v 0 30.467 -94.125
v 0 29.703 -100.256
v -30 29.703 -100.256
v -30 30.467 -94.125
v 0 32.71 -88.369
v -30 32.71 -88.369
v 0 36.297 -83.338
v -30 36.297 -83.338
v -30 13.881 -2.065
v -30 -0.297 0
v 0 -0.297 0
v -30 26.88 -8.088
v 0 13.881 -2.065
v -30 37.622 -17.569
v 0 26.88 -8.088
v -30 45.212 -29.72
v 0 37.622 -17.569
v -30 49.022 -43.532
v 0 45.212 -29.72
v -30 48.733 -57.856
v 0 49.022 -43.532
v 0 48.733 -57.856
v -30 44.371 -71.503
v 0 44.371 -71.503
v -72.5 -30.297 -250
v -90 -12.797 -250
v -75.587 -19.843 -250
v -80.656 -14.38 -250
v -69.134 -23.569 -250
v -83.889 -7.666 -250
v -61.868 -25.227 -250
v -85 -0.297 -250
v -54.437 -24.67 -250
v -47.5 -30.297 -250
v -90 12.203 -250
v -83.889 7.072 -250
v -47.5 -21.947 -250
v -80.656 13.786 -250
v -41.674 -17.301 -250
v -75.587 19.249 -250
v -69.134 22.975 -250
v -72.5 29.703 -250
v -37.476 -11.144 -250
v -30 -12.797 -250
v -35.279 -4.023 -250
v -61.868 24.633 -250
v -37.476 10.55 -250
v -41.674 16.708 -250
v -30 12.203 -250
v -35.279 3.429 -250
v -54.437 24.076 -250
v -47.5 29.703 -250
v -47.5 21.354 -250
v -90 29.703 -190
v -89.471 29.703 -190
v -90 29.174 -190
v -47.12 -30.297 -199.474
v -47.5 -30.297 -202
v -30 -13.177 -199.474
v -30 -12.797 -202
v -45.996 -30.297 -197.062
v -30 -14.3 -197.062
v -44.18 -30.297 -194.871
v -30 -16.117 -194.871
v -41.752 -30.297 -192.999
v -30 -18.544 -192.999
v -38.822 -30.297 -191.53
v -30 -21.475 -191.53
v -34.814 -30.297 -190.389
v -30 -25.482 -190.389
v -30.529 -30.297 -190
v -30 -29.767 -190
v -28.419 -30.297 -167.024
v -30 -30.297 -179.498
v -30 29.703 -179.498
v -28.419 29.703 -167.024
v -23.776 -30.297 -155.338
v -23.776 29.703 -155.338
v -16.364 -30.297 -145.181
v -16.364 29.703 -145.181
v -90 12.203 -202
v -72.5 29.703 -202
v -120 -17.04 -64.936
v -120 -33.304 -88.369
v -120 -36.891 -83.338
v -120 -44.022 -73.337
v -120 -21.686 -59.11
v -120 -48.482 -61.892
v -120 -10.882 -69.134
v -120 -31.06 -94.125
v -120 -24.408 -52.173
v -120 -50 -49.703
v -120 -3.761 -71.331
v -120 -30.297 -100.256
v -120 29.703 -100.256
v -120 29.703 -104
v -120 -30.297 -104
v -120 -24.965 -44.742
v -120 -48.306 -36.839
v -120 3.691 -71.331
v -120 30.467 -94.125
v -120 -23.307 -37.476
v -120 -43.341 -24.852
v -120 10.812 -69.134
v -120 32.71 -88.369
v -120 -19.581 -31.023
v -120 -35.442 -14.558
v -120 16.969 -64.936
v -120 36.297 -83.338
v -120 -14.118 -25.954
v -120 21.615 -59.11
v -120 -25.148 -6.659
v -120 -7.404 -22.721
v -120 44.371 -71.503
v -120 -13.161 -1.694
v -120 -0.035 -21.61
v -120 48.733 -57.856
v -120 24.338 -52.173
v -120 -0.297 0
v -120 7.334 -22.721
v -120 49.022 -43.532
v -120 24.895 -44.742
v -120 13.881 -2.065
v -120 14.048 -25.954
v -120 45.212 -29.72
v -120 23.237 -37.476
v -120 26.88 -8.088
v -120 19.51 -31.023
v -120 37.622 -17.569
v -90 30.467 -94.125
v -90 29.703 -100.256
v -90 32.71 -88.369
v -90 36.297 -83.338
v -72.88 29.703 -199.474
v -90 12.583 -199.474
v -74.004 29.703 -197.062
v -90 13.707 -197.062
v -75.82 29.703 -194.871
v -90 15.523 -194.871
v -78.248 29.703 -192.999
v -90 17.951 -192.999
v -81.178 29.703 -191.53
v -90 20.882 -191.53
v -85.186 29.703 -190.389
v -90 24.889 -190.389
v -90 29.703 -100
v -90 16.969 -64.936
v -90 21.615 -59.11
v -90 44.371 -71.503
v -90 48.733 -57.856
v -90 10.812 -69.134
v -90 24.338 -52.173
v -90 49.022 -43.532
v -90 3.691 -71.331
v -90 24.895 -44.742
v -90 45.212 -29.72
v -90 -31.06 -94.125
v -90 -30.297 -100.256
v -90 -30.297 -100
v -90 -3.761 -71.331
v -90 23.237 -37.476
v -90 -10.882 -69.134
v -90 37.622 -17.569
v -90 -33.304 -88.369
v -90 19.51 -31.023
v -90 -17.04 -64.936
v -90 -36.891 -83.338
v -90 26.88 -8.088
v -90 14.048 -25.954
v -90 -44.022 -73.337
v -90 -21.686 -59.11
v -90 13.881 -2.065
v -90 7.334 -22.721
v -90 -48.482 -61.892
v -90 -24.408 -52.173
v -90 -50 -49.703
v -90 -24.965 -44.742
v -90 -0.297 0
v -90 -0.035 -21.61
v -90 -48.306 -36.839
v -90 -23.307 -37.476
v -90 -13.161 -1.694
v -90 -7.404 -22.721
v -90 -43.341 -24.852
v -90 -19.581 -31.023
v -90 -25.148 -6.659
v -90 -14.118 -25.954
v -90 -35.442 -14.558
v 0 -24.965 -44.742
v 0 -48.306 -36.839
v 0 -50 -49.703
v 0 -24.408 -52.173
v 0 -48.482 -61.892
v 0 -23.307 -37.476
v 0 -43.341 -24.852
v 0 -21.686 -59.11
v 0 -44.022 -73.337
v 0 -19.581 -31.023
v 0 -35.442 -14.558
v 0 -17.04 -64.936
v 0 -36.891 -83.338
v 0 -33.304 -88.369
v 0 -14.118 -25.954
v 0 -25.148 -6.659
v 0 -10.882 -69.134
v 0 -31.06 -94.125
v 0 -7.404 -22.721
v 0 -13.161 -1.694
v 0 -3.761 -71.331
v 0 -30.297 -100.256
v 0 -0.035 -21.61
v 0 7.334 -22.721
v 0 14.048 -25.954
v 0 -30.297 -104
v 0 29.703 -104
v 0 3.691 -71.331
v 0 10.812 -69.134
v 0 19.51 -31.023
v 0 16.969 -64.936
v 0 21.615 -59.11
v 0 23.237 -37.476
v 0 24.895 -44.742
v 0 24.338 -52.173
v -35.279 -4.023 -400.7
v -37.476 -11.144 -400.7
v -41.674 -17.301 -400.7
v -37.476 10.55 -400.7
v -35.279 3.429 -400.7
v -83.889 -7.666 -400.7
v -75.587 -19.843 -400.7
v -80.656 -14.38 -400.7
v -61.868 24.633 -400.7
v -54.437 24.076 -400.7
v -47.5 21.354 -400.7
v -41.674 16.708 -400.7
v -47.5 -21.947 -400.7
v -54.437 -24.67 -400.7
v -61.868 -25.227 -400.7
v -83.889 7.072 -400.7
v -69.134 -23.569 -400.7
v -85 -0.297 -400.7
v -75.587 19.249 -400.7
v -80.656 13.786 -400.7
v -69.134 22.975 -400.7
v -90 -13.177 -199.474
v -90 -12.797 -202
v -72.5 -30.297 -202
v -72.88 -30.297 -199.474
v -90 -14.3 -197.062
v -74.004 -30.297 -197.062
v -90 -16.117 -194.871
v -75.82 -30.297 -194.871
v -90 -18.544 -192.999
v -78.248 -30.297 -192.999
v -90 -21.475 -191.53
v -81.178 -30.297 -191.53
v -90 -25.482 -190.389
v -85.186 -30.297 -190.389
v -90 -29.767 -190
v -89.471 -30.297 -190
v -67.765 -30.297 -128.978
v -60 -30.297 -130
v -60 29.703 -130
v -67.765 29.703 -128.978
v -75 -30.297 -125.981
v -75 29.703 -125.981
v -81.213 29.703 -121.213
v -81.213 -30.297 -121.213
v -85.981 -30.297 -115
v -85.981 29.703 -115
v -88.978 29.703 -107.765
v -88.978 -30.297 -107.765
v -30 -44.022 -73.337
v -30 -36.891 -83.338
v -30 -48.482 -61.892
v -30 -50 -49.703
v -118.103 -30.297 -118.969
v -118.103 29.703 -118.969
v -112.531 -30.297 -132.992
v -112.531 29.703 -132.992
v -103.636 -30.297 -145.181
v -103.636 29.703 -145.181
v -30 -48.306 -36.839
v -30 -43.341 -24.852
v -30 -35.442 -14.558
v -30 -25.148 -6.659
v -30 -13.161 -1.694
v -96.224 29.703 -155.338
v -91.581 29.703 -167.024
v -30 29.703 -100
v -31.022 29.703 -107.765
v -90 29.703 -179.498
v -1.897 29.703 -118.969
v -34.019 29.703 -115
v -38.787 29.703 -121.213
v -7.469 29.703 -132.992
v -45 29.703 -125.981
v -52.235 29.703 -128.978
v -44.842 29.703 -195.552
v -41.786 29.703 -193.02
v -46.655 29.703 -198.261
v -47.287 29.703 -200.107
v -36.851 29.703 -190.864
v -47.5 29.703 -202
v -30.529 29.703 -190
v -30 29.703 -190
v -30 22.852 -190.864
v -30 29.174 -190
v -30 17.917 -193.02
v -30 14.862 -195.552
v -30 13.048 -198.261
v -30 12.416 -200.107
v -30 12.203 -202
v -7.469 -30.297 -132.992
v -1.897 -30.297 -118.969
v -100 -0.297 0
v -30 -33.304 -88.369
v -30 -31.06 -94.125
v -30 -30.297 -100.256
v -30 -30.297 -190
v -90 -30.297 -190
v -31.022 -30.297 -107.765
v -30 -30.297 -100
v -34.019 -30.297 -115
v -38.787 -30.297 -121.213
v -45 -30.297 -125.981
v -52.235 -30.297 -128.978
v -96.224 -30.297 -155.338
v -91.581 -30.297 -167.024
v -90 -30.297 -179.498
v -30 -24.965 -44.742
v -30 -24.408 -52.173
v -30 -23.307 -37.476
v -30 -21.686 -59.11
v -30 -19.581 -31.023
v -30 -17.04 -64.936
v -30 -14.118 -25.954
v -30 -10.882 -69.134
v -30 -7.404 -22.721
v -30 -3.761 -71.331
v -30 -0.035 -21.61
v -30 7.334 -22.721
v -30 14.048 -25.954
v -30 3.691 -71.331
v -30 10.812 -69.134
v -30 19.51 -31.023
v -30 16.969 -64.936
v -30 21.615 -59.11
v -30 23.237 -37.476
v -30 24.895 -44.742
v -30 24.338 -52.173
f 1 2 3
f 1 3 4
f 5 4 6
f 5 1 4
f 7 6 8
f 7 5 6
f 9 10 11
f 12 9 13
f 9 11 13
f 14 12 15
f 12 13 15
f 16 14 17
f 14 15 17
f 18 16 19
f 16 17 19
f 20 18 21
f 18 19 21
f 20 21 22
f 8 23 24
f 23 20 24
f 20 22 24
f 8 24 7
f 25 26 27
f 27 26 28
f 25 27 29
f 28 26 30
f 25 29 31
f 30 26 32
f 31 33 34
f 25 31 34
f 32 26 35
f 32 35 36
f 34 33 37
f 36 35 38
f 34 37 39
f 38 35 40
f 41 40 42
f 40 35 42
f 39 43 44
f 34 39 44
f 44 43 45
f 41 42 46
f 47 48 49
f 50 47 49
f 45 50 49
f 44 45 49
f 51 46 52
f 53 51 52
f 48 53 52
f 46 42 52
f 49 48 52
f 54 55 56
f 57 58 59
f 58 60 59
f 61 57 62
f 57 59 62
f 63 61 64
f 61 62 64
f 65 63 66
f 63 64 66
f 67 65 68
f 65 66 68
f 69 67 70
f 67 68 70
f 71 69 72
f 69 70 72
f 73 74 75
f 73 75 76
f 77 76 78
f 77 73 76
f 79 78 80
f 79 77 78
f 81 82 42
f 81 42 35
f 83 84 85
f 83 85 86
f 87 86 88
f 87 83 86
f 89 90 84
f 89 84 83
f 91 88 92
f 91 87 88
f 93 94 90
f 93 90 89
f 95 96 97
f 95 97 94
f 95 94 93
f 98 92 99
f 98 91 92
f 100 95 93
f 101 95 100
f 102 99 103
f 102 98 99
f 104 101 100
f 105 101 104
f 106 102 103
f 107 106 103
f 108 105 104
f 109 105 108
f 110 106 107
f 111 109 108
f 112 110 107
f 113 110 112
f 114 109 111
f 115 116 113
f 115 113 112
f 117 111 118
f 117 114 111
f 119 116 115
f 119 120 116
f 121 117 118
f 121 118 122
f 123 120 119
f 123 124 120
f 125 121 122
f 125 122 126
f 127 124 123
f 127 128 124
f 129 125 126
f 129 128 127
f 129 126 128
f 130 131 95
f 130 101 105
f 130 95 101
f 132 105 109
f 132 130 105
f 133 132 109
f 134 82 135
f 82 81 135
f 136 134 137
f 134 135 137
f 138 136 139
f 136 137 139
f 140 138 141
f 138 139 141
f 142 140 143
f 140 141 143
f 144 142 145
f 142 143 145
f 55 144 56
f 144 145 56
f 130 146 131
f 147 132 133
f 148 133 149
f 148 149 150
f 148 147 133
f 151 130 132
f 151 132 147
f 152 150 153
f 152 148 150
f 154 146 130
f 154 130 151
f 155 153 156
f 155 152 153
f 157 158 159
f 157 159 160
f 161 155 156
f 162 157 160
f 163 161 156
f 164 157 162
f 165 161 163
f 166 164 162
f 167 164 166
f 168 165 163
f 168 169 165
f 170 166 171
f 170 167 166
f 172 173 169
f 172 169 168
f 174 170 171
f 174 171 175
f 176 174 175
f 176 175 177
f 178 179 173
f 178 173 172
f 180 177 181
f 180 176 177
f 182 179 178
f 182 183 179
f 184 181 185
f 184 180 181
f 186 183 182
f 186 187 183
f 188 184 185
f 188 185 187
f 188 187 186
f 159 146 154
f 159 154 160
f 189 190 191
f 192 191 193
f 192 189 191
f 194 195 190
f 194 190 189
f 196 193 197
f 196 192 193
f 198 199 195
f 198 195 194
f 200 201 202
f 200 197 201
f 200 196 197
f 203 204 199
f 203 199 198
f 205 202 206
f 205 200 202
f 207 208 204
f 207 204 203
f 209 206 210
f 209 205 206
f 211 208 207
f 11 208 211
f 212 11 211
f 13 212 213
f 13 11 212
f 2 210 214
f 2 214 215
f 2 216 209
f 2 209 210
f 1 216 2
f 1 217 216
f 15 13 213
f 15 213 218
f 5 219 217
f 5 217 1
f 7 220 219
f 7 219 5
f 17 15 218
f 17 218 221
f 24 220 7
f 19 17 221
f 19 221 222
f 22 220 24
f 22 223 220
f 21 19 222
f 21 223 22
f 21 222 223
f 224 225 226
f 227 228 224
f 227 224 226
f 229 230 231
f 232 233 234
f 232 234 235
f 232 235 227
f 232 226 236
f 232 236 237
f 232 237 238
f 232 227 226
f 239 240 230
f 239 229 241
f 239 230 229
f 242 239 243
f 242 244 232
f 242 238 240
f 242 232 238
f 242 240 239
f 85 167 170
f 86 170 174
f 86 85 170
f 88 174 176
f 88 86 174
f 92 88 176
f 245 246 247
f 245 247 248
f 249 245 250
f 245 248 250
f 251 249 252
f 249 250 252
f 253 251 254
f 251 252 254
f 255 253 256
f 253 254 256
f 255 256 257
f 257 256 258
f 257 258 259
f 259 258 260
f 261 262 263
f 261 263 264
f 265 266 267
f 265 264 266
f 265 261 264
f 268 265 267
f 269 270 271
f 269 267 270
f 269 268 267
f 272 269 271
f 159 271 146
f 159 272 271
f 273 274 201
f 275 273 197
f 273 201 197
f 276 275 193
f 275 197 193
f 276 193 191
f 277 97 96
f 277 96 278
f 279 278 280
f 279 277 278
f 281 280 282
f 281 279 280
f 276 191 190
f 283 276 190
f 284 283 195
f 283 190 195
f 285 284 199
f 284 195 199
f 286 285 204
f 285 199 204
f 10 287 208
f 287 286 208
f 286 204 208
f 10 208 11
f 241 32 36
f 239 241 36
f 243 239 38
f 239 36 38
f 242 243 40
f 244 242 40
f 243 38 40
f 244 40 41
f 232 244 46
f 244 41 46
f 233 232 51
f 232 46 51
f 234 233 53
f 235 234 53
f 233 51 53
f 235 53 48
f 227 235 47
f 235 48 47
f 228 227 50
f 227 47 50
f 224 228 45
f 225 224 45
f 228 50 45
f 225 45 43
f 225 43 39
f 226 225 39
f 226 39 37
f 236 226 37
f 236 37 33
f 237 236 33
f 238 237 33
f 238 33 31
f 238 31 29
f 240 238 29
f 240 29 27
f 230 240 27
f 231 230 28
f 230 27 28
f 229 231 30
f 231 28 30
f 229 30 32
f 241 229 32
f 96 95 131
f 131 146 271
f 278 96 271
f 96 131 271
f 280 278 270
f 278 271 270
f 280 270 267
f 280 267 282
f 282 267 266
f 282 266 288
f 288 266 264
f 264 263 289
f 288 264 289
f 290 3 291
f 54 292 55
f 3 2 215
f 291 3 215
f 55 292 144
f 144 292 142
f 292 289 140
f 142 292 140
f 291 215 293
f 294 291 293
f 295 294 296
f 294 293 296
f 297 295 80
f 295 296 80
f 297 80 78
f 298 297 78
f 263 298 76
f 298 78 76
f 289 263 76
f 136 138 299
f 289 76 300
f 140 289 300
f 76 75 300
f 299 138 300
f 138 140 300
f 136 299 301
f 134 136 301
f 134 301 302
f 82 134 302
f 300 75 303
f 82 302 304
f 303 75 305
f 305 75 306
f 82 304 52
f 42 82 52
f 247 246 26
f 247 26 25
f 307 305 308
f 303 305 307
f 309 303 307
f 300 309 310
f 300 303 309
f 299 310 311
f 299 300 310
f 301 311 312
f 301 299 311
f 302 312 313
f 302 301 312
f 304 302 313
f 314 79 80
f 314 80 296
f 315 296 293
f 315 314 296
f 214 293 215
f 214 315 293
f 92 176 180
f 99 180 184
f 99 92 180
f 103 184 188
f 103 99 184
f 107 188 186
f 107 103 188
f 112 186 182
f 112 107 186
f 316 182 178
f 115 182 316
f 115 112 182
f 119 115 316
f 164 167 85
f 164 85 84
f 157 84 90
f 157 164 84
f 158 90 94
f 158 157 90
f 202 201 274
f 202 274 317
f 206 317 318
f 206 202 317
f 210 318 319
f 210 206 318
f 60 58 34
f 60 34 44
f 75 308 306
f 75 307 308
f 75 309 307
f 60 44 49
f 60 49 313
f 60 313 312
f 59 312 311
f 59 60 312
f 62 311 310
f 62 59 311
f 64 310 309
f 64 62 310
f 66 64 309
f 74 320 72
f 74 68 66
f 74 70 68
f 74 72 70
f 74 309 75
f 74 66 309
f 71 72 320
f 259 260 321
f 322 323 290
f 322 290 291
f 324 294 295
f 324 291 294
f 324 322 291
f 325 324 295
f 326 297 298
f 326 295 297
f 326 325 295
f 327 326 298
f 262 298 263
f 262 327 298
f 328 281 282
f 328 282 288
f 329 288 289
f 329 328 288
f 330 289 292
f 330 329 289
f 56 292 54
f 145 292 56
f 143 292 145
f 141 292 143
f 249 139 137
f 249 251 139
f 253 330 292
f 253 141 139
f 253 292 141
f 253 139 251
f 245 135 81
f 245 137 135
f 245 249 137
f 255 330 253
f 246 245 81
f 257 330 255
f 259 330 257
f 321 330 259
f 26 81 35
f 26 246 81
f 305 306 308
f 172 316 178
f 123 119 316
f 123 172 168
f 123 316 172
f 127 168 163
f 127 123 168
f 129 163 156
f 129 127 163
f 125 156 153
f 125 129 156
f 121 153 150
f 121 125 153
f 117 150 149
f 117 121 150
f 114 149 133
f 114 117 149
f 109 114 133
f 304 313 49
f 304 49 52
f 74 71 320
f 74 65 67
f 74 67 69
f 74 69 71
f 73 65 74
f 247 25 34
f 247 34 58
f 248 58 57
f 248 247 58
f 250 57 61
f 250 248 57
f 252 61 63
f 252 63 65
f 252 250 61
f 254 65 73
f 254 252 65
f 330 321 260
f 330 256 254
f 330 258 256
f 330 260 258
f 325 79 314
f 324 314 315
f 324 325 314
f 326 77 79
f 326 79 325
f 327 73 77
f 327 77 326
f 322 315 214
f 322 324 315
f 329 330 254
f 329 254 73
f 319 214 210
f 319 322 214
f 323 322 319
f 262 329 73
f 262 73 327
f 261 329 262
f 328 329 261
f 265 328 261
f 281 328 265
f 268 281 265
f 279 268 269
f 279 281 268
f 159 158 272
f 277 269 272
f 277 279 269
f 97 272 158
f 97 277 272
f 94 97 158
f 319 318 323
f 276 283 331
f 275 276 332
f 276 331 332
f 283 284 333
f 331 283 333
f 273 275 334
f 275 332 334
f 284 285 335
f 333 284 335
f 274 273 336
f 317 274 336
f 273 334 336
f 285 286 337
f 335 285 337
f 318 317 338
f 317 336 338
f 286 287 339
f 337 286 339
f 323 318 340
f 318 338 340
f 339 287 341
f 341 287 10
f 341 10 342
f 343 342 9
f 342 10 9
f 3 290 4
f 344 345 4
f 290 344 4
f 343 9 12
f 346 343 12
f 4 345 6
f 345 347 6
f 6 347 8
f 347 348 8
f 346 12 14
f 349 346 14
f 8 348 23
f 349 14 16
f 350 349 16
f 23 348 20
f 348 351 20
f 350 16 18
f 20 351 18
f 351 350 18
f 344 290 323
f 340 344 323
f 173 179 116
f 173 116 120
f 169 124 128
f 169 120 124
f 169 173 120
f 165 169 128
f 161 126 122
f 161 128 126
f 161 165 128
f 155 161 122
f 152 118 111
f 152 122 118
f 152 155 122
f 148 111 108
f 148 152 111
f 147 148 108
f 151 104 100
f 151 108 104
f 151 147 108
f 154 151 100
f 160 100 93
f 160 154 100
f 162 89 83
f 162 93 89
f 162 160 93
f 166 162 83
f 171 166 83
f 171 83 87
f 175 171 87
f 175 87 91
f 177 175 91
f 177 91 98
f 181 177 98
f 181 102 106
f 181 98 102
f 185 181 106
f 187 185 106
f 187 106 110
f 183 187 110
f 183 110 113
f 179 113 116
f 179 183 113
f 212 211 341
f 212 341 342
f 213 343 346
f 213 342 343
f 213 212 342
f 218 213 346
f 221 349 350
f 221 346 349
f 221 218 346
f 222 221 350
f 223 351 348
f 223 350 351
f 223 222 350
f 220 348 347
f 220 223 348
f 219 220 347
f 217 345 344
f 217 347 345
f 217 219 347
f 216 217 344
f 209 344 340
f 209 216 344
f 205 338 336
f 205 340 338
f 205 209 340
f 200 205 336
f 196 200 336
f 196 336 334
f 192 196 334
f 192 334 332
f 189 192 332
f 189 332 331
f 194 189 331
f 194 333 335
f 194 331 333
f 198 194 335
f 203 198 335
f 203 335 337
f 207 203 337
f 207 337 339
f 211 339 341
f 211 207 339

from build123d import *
from build123d.topology import SkipClean

# Parameters (mm, degrees)
SKETCH2_W                = 120
SKETCH2_H                = 250
BOSS_EXTRUDE1_DEPTH      = 50
CUT_EXTRUDE1_DEPTH       = 295.78805946
CUT_EXTRUDE1_DEPTH_BACK  = 295.78805946
CUT_EXTRUDE2_DEPTH       = 100
CUT_EXTRUDE3_DEPTH       = 282.780056072
CUT_EXTRUDE3_DEPTH_BACK  = 282.780056072
FILLET1_R                = 25
CUT_EXTRUDE5_DEPTH       = 60
FILLET4_R                = 12
SKETCH8_R                = 25
BOSS_EXTRUDE2_DEPTH      = 150.7
CUT_EXTRUDE11_DEPTH      = 422.260596346
CUT_EXTRUDE11_DEPTH_BACK = 422.260596346
SKETCH9_R                = 25


with BuildPart() as part:
    # Sketch2 → Boss-Extrude1 (new, symmetric)
    with BuildSketch(Plane(origin=(0, 0, 0), x_dir=(1, 0, 0), z_dir=(0, 1, 0))):
        with Locations((-60, 125)):
            Rectangle(SKETCH2_W, SKETCH2_H)
    extrude(amount=BOSS_EXTRUDE1_DEPTH, both=True)

    # Sketch3 → Cut-Extrude1 (cut, two sides: drawn at the far end of the back side and taken through both)
    with BuildSketch(Plane(origin=(0, 50, 0), x_dir=(1, 0, 0), z_dir=(0, 1, 0)).offset(-CUT_EXTRUDE1_DEPTH_BACK)):
        with BuildLine():
            ThreePointArc((-30, 100), (-60, 130), (-90, 100))
            Line((-90, 100), (-90, 0))
            Line((-90, 0), (-30, 0))
            Line((-30, 0), (-30, 100))
        make_face()
        with BuildLine():
            Line((-120, 250), (-120, 104))
            ThreePointArc((-120, 104), (-115.759222637, 126.156468376), (-103.636363636, 145.180915101))
            ThreePointArc((-103.636363636, 145.180915101), (-93.533981136, 161.034620706), (-90, 179.498344353))
            Line((-90, 179.498344353), (-90, 250))
            Line((-90, 250), (-120, 250))
        make_face()
        with BuildLine():
            ThreePointArc((-16.363636364, 145.180915101), (-4.240777363, 126.156468376), (0, 104))
            Line((0, 104), (0, 250))
            Line((0, 250), (-30, 250))
            Line((-30, 250), (-30, 179.498344353))
            ThreePointArc((-30, 179.498344353), (-26.466018864, 161.034620706), (-16.363636364, 145.180915101))
        make_face()
    extrude(amount=CUT_EXTRUDE1_DEPTH + CUT_EXTRUDE1_DEPTH_BACK, mode=Mode.SUBTRACT)

    # Sketch4 → Cut-Extrude2 (cut)
    with BuildSketch(Plane(origin=(0, 0, 0), x_dir=(0, 0, -1), z_dir=(1, 0, 0))):
        with BuildLine():
            ThreePointArc((89.331663554, -30.296760633), (71.831443345, -44.802429848), (49.703239367, -50))
            Line((49.703239367, -50), (250, -50))
            Line((250, -50), (250, -30.296760633))
            Line((250, -30.296760633), (89.331663554, -30.296760633))
        make_face()
        with BuildLine():
            Line((0, -50), (49.703239367, -50))
            ThreePointArc((49.703239367, -50), (14.557741777, -35.442258249), (0, -0.29676067))
            Line((0, -0.29676067), (0, -50))
        make_face()
        with BuildLine():
            Line((0, 50), (0, -0.29676067))
            ThreePointArc((0, -0.29676067), (33.879981934, 46.820502952), (89.331663554, 29.703239367))
            Line((89.331663554, 29.703239367), (250, 29.703239367))
            Line((250, 29.703239367), (250, 50))
            Line((250, 50), (0, 50))
        make_face()
    extrude(amount=-CUT_EXTRUDE2_DEPTH, mode=Mode.SUBTRACT)

    # Sketch5 → Cut-Extrude3 (cut, two sides: drawn at the far end of the back side and taken through both)
    with SkipClean():  # the faces are left unmerged after this step: merging them gives an invalid solid
        with BuildSketch(Plane(origin=(0, 0, 0), x_dir=(0, 0, -1), z_dir=(1, 0, 0)).offset(-CUT_EXTRUDE3_DEPTH_BACK)):
            with BuildLine():
                Line((89.331663554, 29.703239367), (149.498344353, 29.703239367))
                Line((149.498344353, 29.703239367), (149.498344353, 50))
                Line((149.498344353, 50), (0, 50))
                Line((0, 50), (0, -0.296760633))
                ThreePointArc((0, -0.296760633), (33.879981952, 46.820502958), (89.331663554, 29.703239367))
            make_face()
            with BuildLine():
                Line((149.498344353, -30.296760633), (89.331663554, -30.296760633))
                ThreePointArc((89.331663554, -30.296760633), (71.831443345, -44.802429848), (49.703239367, -50))
                Line((49.703239367, -50), (149.498344353, -50))
                Line((149.498344353, -50), (149.498344353, -30.296760633))
            make_face()
            with BuildLine():
                ThreePointArc((49.703239367, -50), (14.557741764, -35.442258236), (0, -0.296760633))
                Line((0, -0.296760633), (0, -50))
                Line((0, -50), (49.703239367, -50))
            make_face()
        extrude(amount=CUT_EXTRUDE3_DEPTH + CUT_EXTRUDE3_DEPTH_BACK, mode=Mode.SUBTRACT)

    # Fillet1
    fillet1_edges = [part.edges().sort_by_distance(p)[0] for p in [
        (-15, -30.296760633, -89.331663554),
    ]]
    fillet(fillet1_edges, radius=FILLET1_R)
    fillet1_2_edges = [part.edges().sort_by_distance(p)[0] for p in [
        (-95, -30.296760633, -89.331663554),
        (-110, -30.296760633, -89.331663554),
    ]]
    fillet(fillet1_2_edges, radius=FILLET1_R)
    fillet1_3_edges = [part.edges().sort_by_distance(p)[0] for p in [
        (-95, 29.703239367, -89.331663554),
        (-110, 29.703239367, -89.331663554),
    ]]
    fillet(fillet1_3_edges, radius=FILLET1_R)
    fillet1_4_edges = [part.edges().sort_by_distance(p)[0] for p in [
        (-15, 29.703239367, -89.331663554),
    ]]
    fillet(fillet1_4_edges, radius=FILLET1_R)

    # Sketch6 → Cut-Extrude5 (cut)
    with BuildSketch(Plane(origin=(0, 0, -250), x_dir=(-1, 0, 0), z_dir=(0, 0, -1))):
        Polygon((90, 12.203239367), (90, 29.703239367), (72.5, 29.703239367), align=None)
        Polygon((90, -30.296760633), (90, -12.796760633), (72.5, -30.296760633), align=None)
        Polygon((47.5, -30.296760633), (30, -12.796760633), (30, -30.296760633), align=None)
        Polygon((30, 12.203239367), (47.5, 29.703239367), (30, 29.703239367), align=None)
    extrude(amount=-CUT_EXTRUDE5_DEPTH, mode=Mode.SUBTRACT)

    # Fillet4
    fillet4_edges = [part.edges().sort_by_distance(p)[0] for p in [
        (-81.25, -21.546760633, -190),
        (-81.25, 20.953239367, -190),
        (-38.75, -21.546760633, -190),
        (-38.75, 20.953239367, -190),
    ]]
    fillet(fillet4_edges, radius=FILLET4_R)

    # Sketch8 → Boss-Extrude2 (add)
    with BuildSketch(Plane(origin=(0, 0, -250), x_dir=(-1, 0, 0), z_dir=(0, 0, -1))):
        with Locations((60, -0.296760633)):
            Circle(SKETCH8_R)
    extrude(amount=BOSS_EXTRUDE2_DEPTH)

    # Sketch9 → Cut-Extrude11 (cut, two sides: drawn at the far end of the back side and taken through both)
    with BuildSketch(Plane.ZY.offset(120).offset(-CUT_EXTRUDE11_DEPTH_BACK)):
        with Locations((-46.609873597, -0.035297833)):
            Circle(SKETCH9_R)
    extrude(amount=CUT_EXTRUDE11_DEPTH + CUT_EXTRUDE11_DEPTH_BACK, mode=Mode.SUBTRACT)


solid = part.part
